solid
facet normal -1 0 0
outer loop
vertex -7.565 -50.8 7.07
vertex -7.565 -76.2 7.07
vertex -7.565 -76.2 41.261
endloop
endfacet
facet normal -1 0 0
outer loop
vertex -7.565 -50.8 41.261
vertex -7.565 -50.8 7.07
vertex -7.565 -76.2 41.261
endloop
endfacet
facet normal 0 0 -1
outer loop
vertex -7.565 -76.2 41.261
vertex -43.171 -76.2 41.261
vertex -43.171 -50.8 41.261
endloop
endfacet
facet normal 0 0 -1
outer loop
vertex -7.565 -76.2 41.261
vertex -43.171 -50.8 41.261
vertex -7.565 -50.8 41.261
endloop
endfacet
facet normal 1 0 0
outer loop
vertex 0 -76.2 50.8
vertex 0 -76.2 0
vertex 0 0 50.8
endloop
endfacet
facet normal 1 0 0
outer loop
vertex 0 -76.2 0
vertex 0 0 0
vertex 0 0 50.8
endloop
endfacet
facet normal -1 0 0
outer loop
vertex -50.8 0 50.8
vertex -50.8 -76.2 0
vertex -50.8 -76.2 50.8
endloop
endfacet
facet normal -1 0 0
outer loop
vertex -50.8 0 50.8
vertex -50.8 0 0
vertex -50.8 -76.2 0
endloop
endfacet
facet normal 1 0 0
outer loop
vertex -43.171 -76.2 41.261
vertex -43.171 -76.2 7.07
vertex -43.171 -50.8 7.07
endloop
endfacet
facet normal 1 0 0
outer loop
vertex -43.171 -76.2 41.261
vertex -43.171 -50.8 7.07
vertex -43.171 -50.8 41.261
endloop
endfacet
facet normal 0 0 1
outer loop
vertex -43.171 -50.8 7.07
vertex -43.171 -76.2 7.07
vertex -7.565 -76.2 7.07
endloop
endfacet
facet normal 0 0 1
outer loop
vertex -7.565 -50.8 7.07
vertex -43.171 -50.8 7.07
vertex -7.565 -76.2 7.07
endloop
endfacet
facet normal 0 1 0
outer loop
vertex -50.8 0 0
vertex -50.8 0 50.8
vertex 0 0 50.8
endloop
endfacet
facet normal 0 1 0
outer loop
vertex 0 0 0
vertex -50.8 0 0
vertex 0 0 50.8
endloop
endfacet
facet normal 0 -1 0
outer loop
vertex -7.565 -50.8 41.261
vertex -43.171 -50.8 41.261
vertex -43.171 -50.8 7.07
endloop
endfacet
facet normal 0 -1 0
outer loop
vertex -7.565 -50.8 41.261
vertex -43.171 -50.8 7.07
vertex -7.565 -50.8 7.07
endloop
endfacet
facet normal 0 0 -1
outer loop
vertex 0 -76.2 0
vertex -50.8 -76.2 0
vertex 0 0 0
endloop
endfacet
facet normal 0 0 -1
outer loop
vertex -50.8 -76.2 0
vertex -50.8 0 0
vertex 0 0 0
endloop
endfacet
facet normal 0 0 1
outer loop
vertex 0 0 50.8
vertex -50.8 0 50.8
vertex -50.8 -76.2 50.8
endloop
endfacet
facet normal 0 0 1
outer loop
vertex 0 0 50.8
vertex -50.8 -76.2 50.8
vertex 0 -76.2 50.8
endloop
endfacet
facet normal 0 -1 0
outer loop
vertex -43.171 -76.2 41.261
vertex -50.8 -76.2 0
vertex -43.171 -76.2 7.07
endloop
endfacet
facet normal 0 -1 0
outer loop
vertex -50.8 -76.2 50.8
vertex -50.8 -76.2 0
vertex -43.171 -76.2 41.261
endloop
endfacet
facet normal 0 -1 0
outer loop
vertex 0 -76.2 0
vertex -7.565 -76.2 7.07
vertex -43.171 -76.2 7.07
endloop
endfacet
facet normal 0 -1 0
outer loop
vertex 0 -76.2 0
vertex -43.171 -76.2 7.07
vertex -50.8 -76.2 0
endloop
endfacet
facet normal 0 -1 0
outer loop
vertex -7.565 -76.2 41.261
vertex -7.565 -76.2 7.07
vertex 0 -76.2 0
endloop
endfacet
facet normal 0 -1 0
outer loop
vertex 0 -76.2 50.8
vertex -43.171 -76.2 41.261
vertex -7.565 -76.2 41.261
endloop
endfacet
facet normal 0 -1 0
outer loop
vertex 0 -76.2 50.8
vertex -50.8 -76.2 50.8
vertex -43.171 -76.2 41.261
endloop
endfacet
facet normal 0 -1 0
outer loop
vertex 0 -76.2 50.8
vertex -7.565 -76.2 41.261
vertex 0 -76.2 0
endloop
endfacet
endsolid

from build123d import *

# Parameters (mm, degrees)
F0_W      = 50.8
F0_H      = 50.8
F1_DEPTH  = 50.8
F1_FACE_W = 50.8
F1_FACE_H = 50.8
F2_DEPTH  = 25.4
F3_W      = 35.606458
F3_H      = 34.19029
F4_DEPTH  = 25.4


with BuildPart() as f1:
    # F0 (on Front) → F1 (new body)
    with BuildSketch(Plane.XZ):
        with Locations((-25.4, 25.4)):
            Rectangle(F0_W, F0_H)
    extrude(amount=F1_DEPTH)

    # F1_face (on face) → F2 (join)
    with BuildSketch(Plane(origin=(-25.4, -50.8, 25.4), x_dir=(1, 0, 0), z_dir=(0, -1, 0))):
        Rectangle(F1_FACE_W, F1_FACE_H)
    extrude(amount=F2_DEPTH)

    # F3 (on face) → F4 (cut)
    with BuildSketch(Plane.XZ.offset(76.2)):
        with Locations((-25.368032, 24.165593)):
            Rectangle(F3_W, F3_H)
    extrude(amount=-F4_DEPTH, mode=Mode.SUBTRACT)


solid = f1.part
